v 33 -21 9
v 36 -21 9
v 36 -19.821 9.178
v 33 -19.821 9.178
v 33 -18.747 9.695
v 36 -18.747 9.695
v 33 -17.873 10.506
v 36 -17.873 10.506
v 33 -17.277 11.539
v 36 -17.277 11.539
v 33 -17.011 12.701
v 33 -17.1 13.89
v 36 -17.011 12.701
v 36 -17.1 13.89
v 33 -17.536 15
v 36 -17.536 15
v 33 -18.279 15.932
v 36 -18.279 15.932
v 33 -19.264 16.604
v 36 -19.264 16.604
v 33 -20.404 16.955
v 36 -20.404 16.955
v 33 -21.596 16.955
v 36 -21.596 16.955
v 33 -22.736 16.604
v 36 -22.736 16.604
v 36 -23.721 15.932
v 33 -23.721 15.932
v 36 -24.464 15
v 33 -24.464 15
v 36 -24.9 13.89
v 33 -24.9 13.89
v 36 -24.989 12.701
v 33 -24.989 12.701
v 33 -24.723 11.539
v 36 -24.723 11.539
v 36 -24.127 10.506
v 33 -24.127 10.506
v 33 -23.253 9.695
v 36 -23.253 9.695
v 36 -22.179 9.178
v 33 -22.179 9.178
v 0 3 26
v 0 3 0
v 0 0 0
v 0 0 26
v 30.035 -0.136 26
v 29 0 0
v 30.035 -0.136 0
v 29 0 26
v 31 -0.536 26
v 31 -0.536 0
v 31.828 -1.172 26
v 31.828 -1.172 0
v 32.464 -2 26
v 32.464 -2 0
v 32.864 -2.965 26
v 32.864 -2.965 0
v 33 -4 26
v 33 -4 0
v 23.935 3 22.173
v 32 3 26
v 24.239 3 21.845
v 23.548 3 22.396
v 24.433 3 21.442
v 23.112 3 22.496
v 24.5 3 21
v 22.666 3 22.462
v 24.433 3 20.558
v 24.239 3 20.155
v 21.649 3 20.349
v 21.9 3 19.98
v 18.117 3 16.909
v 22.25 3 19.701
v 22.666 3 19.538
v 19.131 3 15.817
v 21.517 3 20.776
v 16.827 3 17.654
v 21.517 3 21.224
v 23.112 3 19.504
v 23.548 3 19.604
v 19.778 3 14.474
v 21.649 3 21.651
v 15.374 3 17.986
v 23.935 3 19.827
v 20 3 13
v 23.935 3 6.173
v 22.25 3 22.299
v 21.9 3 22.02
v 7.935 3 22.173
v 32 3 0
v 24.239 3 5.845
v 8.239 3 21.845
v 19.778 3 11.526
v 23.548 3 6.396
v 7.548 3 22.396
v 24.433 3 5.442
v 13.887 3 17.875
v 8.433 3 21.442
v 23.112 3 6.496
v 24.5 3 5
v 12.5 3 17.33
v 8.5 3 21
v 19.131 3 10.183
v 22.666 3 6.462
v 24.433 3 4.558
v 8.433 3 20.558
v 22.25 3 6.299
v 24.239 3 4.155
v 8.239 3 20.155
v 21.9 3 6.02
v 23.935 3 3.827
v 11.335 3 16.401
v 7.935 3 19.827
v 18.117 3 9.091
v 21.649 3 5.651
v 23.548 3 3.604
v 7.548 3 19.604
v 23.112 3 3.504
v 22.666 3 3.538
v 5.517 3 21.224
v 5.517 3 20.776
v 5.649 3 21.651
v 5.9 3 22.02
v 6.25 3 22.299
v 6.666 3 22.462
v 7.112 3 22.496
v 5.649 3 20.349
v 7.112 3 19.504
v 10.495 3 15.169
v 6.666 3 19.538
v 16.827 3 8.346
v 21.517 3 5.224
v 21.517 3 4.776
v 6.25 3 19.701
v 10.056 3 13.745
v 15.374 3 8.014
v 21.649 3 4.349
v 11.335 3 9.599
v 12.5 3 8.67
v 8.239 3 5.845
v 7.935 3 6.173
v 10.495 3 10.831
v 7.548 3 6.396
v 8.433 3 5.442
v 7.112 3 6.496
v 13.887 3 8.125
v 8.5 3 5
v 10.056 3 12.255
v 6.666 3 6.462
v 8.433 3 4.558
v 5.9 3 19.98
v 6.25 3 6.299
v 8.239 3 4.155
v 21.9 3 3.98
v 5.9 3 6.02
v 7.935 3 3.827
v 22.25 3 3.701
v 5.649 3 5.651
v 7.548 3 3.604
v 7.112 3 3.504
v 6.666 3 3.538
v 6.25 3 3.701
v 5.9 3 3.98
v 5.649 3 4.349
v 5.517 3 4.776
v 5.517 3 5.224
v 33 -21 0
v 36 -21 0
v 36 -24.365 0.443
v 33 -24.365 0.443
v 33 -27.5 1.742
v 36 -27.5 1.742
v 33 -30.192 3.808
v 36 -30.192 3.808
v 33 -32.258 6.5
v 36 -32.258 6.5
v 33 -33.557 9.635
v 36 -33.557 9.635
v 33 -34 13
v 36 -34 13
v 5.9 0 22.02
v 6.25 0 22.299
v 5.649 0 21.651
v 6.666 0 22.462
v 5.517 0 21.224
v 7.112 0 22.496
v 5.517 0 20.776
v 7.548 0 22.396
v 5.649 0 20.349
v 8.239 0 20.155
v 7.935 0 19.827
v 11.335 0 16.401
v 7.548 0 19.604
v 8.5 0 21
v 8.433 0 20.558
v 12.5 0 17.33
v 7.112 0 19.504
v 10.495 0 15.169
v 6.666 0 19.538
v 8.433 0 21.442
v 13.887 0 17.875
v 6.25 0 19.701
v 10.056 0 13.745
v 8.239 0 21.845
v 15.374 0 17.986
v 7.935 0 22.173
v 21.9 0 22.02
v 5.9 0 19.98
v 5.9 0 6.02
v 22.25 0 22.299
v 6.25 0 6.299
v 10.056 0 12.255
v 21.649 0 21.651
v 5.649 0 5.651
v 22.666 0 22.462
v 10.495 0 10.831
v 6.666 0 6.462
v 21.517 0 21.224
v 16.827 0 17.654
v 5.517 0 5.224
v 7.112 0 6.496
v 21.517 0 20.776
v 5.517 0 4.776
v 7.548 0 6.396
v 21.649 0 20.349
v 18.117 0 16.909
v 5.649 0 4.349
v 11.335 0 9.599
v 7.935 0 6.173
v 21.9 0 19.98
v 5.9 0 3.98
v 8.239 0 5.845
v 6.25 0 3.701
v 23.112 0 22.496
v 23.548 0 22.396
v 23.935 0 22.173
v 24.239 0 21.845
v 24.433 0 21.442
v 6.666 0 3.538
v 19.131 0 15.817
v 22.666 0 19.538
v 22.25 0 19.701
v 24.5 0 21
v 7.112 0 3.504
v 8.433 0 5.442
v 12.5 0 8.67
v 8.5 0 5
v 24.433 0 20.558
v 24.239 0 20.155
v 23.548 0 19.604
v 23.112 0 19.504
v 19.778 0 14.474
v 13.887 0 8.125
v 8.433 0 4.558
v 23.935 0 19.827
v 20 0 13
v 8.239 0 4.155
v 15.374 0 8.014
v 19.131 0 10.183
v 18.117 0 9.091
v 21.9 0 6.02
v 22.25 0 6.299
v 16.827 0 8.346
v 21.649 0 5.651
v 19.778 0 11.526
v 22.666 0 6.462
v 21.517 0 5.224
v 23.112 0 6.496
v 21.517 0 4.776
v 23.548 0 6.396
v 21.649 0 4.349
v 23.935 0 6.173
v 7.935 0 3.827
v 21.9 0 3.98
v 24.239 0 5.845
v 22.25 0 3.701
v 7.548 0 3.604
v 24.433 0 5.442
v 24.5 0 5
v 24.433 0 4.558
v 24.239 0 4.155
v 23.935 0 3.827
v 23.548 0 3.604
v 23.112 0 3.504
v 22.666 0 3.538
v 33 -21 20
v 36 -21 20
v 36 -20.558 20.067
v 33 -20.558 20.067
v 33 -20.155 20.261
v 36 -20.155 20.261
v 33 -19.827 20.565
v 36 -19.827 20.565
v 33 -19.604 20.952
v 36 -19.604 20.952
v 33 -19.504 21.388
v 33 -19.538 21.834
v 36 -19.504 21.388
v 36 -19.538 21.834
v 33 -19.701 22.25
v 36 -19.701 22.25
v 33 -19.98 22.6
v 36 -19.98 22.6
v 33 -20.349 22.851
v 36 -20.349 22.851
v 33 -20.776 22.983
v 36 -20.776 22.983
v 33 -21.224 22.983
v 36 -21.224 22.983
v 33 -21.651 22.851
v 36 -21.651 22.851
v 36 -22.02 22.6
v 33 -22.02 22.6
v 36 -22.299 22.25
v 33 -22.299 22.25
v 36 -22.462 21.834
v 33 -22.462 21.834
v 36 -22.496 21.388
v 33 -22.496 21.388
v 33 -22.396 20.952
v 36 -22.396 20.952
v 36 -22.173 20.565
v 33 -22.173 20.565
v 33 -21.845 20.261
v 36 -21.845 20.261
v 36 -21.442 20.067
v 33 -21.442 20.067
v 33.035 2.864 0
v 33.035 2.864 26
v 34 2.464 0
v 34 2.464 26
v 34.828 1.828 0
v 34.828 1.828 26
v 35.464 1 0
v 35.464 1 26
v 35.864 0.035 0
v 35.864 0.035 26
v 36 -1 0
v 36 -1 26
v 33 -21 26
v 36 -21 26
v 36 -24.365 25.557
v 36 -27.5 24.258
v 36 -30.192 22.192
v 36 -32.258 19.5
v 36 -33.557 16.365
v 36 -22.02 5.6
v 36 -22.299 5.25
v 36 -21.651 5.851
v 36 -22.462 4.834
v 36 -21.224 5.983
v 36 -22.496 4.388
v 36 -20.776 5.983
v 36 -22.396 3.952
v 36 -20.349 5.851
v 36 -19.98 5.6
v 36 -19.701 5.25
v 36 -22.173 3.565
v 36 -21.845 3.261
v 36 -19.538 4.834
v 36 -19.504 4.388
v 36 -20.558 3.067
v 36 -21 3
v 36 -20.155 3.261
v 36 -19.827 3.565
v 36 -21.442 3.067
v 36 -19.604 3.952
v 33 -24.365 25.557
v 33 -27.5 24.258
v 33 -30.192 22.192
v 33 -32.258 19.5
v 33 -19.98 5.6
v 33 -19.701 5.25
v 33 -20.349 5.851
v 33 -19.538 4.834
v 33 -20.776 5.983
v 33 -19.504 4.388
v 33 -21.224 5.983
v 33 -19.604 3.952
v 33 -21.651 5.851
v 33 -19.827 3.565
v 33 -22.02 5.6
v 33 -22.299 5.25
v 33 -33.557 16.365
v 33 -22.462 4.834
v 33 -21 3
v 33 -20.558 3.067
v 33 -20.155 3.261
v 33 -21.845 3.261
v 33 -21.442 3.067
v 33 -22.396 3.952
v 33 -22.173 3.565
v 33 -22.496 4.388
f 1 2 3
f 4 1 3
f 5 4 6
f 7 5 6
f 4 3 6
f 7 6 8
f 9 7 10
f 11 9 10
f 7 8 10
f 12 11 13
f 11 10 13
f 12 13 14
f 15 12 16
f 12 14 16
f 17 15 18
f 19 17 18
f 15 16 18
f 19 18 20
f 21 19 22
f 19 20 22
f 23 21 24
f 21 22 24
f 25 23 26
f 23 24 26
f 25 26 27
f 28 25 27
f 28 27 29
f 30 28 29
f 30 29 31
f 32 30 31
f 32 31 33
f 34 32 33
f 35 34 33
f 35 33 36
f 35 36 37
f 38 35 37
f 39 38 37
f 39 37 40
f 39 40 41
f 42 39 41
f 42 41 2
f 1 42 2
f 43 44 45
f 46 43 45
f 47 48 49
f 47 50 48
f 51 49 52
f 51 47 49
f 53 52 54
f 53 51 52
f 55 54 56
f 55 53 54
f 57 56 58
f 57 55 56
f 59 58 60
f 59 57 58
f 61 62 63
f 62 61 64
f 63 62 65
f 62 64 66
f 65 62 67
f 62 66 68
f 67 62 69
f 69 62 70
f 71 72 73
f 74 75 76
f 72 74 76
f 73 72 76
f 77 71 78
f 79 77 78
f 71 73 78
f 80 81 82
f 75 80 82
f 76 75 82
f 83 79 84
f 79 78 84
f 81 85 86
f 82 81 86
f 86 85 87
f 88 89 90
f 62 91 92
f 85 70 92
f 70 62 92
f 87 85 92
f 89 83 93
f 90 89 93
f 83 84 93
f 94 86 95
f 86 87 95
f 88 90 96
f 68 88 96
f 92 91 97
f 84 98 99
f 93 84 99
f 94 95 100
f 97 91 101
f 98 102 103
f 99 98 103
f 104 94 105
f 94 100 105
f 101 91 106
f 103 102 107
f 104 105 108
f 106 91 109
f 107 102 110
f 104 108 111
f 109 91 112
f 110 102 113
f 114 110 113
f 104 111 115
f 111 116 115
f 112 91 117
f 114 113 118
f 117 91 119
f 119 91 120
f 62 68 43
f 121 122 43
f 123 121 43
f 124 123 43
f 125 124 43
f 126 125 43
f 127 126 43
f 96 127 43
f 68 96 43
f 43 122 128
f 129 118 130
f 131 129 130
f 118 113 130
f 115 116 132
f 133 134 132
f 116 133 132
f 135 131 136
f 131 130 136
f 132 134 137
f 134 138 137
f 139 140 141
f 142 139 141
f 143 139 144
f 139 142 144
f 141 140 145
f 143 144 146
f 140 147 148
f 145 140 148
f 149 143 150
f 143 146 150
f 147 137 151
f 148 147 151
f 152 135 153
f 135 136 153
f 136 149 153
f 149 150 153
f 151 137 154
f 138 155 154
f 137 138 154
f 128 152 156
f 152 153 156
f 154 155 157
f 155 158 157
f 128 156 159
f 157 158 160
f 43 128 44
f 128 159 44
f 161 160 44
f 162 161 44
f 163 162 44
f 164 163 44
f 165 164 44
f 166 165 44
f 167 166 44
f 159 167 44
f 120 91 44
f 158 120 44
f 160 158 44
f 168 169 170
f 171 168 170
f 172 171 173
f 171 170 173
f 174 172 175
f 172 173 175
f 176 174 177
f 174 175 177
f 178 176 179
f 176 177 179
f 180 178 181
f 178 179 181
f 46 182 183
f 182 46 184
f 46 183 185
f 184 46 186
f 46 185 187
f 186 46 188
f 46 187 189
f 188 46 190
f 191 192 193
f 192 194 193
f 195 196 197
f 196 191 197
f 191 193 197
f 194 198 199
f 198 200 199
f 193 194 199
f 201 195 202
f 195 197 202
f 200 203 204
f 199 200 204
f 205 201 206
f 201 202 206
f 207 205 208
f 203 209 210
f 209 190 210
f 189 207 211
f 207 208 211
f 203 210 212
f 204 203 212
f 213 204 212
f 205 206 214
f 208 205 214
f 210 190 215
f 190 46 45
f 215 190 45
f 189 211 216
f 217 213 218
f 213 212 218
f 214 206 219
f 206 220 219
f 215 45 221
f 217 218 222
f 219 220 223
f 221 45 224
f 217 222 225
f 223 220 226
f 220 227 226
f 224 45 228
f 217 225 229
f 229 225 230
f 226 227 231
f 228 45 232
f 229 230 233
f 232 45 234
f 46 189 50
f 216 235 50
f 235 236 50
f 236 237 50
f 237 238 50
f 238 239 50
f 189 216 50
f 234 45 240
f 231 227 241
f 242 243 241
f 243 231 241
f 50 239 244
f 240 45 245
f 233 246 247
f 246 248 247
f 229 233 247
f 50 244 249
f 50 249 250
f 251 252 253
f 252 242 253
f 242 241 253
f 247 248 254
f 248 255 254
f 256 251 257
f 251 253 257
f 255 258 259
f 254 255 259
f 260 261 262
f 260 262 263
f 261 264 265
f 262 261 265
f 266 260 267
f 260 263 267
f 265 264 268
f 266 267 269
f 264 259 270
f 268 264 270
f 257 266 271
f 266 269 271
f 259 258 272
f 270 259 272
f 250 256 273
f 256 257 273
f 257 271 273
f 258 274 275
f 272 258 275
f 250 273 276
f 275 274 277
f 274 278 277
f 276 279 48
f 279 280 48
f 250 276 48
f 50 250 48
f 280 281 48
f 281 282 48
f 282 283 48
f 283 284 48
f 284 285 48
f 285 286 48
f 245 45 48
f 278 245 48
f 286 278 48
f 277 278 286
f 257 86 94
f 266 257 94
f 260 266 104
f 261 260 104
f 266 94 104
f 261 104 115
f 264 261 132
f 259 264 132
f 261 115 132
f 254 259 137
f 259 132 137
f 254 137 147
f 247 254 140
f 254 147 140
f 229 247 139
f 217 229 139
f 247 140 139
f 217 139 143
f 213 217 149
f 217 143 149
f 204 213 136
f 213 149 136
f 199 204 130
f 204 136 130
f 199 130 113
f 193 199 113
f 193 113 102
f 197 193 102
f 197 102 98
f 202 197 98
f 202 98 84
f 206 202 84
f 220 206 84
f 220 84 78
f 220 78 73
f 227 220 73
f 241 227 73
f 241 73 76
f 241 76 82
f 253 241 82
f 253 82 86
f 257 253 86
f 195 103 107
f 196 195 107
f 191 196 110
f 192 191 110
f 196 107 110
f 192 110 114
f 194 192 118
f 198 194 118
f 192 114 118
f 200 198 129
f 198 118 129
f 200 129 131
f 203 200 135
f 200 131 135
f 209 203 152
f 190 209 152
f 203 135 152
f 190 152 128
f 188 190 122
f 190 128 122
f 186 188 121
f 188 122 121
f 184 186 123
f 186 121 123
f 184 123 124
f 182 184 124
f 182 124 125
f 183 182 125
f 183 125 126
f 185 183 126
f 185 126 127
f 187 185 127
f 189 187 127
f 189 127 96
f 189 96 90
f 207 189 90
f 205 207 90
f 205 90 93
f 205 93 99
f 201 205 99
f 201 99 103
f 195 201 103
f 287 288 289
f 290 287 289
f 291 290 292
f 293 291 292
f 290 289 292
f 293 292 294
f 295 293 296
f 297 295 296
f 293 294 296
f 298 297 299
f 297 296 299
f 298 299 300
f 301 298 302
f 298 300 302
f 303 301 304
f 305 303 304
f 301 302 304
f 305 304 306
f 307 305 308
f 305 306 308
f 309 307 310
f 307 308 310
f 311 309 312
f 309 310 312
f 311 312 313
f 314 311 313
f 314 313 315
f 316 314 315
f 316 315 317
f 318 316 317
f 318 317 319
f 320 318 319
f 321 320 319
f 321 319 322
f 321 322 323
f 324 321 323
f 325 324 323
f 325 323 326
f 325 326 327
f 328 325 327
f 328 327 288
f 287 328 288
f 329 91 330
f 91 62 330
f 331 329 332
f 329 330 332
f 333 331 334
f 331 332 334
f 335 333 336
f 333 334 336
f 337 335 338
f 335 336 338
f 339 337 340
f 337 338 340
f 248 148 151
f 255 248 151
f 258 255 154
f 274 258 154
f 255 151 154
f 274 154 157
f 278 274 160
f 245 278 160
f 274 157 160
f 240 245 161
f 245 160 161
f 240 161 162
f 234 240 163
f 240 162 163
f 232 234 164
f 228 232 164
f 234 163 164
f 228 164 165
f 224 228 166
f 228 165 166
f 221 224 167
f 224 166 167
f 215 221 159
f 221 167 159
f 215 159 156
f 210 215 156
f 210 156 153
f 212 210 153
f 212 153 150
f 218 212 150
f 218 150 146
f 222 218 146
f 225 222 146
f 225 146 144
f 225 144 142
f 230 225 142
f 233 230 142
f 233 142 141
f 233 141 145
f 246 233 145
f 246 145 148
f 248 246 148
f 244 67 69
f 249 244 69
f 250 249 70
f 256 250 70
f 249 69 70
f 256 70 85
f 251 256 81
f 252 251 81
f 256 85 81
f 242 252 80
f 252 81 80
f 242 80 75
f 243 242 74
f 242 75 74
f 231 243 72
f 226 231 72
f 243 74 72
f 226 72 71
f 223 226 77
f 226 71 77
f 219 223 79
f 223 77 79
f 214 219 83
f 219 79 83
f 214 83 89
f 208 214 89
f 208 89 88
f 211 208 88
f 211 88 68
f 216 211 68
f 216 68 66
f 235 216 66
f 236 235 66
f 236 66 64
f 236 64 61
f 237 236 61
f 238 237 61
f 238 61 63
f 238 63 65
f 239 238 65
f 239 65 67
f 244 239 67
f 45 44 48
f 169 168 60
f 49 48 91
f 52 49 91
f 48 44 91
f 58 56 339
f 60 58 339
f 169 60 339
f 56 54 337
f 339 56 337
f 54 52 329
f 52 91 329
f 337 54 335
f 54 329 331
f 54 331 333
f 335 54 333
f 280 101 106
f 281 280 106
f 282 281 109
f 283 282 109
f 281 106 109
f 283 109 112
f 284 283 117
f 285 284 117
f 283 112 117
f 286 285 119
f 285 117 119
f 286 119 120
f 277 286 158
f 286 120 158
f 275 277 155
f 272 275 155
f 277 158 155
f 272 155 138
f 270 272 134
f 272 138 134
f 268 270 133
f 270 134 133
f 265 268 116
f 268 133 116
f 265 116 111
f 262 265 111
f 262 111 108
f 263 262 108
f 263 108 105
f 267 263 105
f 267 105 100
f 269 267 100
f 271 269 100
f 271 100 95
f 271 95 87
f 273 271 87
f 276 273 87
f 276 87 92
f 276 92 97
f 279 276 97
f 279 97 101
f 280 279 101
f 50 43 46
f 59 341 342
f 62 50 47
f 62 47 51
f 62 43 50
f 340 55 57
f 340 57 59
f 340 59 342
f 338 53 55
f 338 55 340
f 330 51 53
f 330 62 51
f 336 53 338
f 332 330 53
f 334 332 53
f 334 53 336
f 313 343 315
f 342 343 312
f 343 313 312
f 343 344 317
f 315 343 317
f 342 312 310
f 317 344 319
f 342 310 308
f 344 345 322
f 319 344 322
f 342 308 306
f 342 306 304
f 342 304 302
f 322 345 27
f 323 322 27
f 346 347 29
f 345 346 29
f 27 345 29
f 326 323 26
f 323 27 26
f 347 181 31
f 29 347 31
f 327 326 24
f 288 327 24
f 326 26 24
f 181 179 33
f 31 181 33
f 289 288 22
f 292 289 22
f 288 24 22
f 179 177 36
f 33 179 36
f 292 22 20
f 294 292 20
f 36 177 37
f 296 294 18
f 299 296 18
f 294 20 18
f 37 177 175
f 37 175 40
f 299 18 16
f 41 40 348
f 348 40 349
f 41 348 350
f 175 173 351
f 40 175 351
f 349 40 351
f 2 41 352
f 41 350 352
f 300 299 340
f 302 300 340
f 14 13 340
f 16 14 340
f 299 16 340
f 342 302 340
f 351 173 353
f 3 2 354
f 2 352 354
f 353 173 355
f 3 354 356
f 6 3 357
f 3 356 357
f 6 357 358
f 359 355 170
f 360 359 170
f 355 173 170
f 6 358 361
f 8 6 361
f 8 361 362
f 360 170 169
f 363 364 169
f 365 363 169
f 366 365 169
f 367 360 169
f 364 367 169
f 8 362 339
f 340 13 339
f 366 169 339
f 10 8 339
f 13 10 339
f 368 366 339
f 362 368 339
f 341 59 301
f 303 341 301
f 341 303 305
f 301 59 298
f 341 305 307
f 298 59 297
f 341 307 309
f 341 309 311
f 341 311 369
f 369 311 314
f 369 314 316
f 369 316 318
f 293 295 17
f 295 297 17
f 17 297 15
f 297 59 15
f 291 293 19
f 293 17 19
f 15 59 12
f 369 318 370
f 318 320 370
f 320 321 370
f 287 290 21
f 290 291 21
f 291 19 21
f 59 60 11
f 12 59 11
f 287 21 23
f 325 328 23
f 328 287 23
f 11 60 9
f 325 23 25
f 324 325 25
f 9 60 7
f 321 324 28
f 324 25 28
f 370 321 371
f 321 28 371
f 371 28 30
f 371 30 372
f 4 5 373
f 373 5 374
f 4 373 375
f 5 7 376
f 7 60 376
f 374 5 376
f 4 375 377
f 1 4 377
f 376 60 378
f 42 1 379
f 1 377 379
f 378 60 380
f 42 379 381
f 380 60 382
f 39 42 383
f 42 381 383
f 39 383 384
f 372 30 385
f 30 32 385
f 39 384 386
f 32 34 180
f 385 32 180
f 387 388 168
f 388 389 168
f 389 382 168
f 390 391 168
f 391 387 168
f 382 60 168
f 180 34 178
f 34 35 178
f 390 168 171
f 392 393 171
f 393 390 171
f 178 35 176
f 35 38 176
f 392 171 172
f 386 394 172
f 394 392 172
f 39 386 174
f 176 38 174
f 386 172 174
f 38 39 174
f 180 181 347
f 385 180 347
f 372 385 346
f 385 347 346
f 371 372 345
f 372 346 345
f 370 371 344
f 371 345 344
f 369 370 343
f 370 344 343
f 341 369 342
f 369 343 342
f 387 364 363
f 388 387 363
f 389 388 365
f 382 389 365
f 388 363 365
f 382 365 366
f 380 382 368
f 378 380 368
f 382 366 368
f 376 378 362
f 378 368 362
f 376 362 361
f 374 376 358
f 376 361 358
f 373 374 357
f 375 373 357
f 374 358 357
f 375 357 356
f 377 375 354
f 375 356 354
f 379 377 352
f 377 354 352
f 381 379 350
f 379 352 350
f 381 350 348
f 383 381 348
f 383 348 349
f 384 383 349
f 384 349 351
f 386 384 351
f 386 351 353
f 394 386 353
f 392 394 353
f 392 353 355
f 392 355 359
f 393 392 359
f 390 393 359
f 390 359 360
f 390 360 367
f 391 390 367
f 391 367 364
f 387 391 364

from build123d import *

# Parameters (mm, degrees)
BOSS_EXTRUDE1_DEPTH = 26
SKETCH2_R           = 1.5
SKETCH2_R_2         = 4
CUT_EXTRUDE1_DEPTH  = 26
FILLET1_R           = 4
SKETCH3_R           = 5
SKETCH3_R_2         = 1.5
CUT_EXTRUDE2_DEPTH  = 26


with BuildPart() as part:
    # Sketch1 → Boss-Extrude1 (new body)
    with BuildSketch(Plane.XY):
        Polygon((0, 0), (33, 0), (33, -34), (36, -34), (36, 3), (0, 3), align=None)
    extrude(amount=BOSS_EXTRUDE1_DEPTH)

    # Sketch2 → Cut-Extrude1 (cut)
    with BuildSketch(Plane(origin=(36, 0, 0), x_dir=(0, 0, -1), z_dir=(1, 0, 0))):
        with BuildLine():
            ThreePointArc((-13, -34), (-22.192388155, -30.192388155), (-26, -21))
            Line((-26, -21), (-26, -34))
            Line((-26, -34), (-13, -34))
        make_face()
        with BuildLine():
            ThreePointArc((0, -21), (-3.807611845, -30.192388155), (-13, -34))
            Line((-13, -34), (0, -34))
            Line((0, -34), (0, -21))
        make_face()
        with Locations((-4.5, -21)):
            Circle(SKETCH2_R)
        with Locations((-13, -21)):
            Circle(SKETCH2_R_2)
        with Locations((-21.5, -21)):
            Circle(SKETCH2_R)
    extrude(amount=-CUT_EXTRUDE1_DEPTH, mode=Mode.SUBTRACT)

    # Fillet1
    fillet1_edges = [part.edges().sort_by_distance(p)[0] for p in [
        (36, 3, 13),
        (33, 0, 13),
    ]]
    fillet(fillet1_edges, radius=FILLET1_R)

    # Sketch3 → Cut-Extrude2 (cut)
    with BuildSketch(Plane(origin=(0, 3, 0), x_dir=(1, 0, 0), z_dir=(0, 1, 0))):
        with Locations((15, -13)):
            Circle(SKETCH3_R)
        with Locations((23, -21)):
            Circle(SKETCH3_R_2)
        with Locations((23, -5)):
            Circle(SKETCH3_R_2)
        with Locations((7, -5)):
            Circle(SKETCH3_R_2)
        with Locations((7, -21)):
            Circle(SKETCH3_R_2)
    extrude(amount=-CUT_EXTRUDE2_DEPTH, mode=Mode.SUBTRACT)


solid = part.part
